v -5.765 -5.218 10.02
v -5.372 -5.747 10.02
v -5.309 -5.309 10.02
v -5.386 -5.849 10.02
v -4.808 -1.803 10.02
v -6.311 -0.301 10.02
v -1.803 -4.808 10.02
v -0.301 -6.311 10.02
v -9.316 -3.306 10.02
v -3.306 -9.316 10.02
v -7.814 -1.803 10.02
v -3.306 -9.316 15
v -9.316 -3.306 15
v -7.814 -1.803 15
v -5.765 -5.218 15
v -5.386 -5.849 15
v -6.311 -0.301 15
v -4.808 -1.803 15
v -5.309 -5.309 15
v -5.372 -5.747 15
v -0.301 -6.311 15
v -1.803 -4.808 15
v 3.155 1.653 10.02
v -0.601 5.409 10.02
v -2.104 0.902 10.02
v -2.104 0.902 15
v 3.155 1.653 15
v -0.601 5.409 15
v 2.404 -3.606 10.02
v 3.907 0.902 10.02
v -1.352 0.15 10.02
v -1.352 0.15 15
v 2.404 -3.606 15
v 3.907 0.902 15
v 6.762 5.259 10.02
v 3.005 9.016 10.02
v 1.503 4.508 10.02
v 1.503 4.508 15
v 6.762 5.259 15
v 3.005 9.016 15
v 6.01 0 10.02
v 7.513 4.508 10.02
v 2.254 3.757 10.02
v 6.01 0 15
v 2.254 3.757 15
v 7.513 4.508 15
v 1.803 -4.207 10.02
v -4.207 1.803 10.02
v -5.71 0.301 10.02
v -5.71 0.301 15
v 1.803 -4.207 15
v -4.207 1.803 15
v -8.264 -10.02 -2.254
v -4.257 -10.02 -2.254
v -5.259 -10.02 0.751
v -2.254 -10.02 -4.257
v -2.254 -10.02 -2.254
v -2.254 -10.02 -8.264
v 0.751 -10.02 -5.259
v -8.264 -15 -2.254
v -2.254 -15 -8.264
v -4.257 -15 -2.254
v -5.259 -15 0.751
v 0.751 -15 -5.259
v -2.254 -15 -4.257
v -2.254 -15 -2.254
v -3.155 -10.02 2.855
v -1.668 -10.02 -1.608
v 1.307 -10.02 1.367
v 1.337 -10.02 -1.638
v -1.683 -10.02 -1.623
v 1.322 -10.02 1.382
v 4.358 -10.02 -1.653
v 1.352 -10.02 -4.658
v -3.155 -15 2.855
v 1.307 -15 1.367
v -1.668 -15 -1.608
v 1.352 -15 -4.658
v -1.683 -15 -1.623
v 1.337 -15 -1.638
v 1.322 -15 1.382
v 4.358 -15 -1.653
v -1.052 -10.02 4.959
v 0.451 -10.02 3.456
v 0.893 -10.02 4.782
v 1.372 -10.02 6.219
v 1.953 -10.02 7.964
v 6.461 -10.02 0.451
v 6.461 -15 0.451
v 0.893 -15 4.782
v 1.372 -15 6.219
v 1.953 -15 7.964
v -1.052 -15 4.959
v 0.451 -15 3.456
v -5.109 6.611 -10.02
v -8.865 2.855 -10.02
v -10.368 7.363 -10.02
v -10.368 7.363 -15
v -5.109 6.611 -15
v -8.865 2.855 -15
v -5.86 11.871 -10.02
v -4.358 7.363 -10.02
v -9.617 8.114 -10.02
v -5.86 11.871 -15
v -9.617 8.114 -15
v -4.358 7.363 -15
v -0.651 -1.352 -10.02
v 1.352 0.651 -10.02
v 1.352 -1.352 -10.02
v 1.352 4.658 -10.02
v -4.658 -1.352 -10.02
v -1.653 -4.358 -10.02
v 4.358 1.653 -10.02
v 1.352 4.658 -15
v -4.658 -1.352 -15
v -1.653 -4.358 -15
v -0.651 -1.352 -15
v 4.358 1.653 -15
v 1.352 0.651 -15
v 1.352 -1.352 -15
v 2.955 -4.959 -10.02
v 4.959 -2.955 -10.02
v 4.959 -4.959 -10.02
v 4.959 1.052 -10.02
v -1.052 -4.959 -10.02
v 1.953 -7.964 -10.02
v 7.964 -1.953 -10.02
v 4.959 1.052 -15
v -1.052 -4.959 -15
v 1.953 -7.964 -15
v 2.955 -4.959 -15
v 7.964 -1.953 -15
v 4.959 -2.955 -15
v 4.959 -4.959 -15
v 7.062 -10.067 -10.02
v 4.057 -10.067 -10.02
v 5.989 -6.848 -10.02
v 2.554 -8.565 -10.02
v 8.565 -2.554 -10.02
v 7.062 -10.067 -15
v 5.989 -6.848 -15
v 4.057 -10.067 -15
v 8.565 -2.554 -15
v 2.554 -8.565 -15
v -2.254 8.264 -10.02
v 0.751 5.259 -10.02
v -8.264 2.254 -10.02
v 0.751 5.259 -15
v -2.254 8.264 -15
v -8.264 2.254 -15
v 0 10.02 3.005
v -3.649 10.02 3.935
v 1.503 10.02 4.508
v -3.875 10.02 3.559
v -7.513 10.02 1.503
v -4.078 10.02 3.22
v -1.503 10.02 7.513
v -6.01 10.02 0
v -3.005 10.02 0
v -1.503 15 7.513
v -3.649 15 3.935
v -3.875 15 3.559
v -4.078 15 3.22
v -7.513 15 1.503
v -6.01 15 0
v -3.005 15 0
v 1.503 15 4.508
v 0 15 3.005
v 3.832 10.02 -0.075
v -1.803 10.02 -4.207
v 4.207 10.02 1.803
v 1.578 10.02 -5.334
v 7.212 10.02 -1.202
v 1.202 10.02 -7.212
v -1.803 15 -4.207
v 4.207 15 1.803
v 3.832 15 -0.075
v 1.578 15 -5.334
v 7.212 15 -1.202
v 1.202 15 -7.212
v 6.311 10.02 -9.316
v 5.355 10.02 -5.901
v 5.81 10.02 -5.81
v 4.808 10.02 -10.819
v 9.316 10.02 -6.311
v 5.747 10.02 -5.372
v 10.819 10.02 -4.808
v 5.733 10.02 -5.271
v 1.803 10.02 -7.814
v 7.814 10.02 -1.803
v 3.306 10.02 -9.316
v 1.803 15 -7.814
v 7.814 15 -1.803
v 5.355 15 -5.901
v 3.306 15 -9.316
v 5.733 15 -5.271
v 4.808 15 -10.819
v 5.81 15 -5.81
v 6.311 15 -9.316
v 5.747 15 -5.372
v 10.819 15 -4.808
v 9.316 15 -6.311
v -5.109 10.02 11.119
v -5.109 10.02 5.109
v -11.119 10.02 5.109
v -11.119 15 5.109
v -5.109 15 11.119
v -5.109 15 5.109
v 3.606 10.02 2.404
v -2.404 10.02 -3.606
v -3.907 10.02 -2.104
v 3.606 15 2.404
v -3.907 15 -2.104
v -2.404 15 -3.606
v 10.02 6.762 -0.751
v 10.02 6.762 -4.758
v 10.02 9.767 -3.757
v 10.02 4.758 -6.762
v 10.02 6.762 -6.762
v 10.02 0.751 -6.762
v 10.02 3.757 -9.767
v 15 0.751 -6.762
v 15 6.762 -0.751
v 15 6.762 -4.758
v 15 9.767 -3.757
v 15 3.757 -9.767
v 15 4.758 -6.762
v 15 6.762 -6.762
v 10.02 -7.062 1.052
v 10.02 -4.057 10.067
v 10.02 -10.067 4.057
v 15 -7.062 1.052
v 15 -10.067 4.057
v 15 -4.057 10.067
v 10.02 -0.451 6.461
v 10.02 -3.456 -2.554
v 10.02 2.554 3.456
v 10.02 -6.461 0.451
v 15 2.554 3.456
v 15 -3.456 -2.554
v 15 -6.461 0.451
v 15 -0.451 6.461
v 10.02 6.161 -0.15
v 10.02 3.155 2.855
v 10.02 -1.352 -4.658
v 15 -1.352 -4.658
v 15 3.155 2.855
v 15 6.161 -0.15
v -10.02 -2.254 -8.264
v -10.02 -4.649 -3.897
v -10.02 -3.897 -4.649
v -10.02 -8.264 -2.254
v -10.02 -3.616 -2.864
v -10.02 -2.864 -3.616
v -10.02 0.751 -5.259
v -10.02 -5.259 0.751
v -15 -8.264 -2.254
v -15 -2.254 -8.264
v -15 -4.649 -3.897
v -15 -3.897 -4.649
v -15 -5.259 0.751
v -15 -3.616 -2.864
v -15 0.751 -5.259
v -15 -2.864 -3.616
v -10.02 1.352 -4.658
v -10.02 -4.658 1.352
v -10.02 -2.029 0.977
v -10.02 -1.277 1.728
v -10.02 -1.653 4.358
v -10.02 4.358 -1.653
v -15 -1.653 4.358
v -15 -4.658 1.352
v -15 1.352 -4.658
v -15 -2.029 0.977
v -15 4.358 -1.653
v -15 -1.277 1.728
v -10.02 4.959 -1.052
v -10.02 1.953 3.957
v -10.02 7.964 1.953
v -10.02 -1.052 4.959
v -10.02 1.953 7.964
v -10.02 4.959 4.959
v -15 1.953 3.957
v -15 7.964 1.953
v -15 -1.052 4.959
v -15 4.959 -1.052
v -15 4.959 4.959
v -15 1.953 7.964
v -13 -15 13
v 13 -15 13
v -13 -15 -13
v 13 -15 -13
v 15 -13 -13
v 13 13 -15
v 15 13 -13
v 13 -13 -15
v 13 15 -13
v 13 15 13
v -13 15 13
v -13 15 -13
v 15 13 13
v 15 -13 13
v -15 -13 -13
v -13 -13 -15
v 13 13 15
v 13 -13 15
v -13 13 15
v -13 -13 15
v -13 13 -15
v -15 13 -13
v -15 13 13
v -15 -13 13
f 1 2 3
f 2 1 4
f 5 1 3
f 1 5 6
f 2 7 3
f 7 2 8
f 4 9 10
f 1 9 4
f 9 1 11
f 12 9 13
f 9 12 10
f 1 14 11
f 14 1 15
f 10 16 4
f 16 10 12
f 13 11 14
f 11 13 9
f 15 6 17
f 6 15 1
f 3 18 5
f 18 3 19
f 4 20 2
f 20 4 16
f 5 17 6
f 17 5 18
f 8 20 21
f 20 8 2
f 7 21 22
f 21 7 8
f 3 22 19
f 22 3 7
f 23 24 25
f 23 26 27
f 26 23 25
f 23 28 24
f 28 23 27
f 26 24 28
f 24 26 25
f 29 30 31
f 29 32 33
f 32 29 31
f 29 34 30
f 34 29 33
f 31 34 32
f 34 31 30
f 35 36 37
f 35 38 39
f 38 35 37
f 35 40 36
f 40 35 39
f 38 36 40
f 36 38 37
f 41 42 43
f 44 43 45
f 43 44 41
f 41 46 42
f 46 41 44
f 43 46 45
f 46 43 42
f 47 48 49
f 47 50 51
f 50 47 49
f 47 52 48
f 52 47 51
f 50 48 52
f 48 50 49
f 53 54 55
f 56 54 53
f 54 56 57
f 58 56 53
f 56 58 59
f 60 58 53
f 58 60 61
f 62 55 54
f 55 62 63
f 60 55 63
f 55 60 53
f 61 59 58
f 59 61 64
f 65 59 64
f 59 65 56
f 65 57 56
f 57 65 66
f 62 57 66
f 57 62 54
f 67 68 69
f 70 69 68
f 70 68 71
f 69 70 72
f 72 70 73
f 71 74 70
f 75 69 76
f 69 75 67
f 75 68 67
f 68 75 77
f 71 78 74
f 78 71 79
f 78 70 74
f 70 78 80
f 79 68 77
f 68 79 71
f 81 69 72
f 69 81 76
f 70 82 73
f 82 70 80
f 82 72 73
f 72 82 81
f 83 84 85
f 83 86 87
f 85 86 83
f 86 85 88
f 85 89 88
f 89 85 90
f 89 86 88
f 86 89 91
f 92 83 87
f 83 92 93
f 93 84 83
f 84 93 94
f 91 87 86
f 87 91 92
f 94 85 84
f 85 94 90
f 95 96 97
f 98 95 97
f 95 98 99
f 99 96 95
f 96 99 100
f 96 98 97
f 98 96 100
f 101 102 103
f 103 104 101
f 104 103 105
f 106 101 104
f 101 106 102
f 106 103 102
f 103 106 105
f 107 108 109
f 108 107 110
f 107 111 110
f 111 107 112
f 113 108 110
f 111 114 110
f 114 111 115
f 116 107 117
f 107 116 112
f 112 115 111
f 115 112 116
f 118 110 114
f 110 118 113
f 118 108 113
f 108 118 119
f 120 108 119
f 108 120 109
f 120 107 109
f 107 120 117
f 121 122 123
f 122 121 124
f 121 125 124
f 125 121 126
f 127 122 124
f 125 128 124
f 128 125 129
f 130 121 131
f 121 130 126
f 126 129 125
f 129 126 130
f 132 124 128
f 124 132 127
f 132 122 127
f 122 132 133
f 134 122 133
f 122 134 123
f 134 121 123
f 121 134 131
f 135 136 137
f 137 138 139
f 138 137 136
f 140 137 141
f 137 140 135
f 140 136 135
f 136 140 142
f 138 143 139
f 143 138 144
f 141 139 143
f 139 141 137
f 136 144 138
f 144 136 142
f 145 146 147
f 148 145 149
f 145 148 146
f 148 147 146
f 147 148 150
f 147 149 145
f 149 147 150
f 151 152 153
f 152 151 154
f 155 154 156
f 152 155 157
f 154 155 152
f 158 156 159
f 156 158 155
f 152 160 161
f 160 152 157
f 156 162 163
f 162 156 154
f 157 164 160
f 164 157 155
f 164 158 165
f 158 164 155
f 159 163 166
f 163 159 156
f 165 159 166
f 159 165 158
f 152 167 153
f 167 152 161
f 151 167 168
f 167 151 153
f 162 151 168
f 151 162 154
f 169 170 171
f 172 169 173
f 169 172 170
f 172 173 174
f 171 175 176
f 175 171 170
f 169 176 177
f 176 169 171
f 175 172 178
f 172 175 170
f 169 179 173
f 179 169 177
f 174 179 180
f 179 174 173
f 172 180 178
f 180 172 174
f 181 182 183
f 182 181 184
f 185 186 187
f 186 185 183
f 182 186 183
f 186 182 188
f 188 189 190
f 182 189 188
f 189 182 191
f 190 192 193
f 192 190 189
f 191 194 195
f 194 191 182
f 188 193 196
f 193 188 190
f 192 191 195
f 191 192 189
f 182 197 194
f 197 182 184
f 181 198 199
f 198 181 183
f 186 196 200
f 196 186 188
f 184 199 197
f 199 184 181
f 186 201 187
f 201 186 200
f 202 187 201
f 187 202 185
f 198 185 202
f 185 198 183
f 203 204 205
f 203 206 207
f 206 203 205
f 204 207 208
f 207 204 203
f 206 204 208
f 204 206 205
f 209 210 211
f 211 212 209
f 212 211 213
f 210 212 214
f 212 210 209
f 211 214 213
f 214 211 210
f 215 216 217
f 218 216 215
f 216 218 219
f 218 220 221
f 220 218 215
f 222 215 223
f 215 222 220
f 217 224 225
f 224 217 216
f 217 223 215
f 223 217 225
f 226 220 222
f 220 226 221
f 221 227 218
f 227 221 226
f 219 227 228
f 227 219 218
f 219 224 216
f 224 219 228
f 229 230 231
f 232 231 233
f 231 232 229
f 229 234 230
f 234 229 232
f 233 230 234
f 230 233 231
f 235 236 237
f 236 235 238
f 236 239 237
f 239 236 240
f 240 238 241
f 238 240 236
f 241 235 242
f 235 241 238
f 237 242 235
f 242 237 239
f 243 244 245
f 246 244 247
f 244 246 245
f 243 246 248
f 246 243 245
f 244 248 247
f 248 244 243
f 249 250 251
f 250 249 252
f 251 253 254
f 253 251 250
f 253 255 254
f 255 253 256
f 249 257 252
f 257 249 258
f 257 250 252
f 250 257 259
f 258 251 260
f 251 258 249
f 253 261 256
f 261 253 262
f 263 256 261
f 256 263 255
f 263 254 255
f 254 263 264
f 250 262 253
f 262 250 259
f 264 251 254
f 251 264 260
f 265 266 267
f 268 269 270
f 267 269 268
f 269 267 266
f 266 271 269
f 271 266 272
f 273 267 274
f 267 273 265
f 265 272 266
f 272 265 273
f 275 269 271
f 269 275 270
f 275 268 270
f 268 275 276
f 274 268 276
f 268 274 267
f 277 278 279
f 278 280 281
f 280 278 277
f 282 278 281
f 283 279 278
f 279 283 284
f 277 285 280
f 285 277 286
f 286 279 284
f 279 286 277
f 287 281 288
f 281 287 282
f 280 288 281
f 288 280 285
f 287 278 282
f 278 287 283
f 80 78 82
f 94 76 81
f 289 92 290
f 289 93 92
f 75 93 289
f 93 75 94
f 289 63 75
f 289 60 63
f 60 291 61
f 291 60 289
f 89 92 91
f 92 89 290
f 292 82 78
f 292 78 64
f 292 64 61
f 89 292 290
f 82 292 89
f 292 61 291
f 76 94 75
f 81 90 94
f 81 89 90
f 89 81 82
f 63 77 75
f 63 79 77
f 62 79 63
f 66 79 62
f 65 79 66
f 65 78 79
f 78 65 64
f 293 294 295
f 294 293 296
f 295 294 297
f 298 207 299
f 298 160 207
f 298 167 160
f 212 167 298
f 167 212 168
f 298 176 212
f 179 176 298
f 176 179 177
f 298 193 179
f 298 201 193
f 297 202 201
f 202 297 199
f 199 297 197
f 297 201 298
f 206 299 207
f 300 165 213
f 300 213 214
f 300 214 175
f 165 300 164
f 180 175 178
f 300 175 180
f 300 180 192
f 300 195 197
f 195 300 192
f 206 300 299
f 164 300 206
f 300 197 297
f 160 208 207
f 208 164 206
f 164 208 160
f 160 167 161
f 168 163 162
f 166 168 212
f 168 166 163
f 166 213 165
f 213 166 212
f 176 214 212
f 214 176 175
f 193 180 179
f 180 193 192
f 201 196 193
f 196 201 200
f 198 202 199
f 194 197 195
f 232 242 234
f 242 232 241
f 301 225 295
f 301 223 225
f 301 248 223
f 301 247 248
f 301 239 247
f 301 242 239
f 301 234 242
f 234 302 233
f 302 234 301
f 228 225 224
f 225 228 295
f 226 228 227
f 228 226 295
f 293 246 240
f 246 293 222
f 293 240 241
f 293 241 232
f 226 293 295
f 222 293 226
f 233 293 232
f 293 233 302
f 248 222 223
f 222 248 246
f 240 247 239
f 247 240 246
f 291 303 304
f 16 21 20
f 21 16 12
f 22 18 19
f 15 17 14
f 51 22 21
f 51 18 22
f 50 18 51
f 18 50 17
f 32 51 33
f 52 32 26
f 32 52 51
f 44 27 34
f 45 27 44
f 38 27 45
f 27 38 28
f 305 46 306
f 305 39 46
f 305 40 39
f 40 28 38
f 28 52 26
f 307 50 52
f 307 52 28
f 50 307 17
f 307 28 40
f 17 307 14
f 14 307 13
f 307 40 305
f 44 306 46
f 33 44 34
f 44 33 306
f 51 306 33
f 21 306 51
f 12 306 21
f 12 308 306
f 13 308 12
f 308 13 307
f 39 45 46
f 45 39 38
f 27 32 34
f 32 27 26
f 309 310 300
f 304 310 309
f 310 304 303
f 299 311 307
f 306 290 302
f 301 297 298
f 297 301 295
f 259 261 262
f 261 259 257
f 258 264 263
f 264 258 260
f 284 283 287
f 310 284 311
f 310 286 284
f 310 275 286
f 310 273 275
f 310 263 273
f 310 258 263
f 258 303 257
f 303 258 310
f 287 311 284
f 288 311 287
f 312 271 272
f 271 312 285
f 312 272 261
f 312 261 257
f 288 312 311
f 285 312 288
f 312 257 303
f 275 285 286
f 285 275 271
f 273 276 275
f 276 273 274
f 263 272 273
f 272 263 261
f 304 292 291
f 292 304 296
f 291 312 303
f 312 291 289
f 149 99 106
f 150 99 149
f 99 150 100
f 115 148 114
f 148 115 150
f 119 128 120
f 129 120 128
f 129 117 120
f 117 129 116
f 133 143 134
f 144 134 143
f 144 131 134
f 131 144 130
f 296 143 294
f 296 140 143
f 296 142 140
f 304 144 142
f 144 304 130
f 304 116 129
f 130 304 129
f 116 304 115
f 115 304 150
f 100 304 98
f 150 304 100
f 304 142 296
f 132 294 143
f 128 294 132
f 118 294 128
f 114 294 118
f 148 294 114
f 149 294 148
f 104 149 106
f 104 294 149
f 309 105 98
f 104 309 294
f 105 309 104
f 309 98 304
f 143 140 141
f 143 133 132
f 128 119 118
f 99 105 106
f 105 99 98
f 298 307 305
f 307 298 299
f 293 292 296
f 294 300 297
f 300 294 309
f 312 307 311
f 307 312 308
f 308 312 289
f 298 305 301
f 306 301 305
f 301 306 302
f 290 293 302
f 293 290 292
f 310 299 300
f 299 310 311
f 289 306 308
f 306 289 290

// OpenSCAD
// fcubewithtextv1_0
// GPLv2
// (c) 2013 TakeItAndRun
//
// v0_1:
// 
// 
//

// INCLUDE

//use <lowpolyfont v1_0.scad>;
//file pasted at end of file

//*******************************************************
//
//
//
//*******************************************************

/* [text] */

ttext1="KISS";
ttext2="EAT";
ttext3="SLEEP";
ttext4="DRINK";
ttext5="LOVE";
ttext6="HUG";

/* type */

//depth of text
dt=5;//[1:10]

//scale for all text
s0=8.5;//[1:25]
//individual text scale
s1=1.0;
s2=1.0;
s3=1.0;
s4=1.0;
s5=1.0;
s6=1.0;

/* [dice] */

//size of dice
dd=30;//[5:100]

//width of edge
de=2;//[1:10]


/* HIDDEN */

ttext=[ttext1,ttext2,ttext3,ttext4,ttext5,ttext6];
s=s0*[s1,s2,s3,s4,s5,s6];

//*******************************************************
//
// basic definitions
//
//*******************************************************


// circle have $fn facets
$fn=32;

// small displacement to avoid parallel faces with zero volume
e=0.02;

// unit vectors
xaxis=[1,0,0];
yaxis=[0,1,0];
zaxis=[0,0,1];

// golden ratio
phi=(1+sqrt(5))/2;

//*******************************************************
//
// dimensions
//
//*******************************************************

dxprint=3;

col1="red";
col2="lime";


//*******************************************************
//
// routines
//
//*******************************************************

module fcube(v=[dd,dd,dd],f=de,center=false){
	translate(center?0:f*[1,1,1])
	minkowski(){
		cube(v-2*f*[1,1,1],center);
		scale(f)polyhedron(
			[[1,0,0],[0,1,0],[-1,0,0],[0,-1,0],[0,0,1],[0,0,-1]],
			[[0,1,4],[1,2,4],[2,3,4],[3,0,4],[1,0,5],[2,1,5],[3,2,5],[0,3,5]]
		);
	}
}

a=[[0,0,0],[90,0,0],[180,0,0],[270,0,0],[0,90,0],[0,270,0]];

module dice(){
	difference(){
		color("blue")
		fcube(center=true);
		for(i=[0:5])
			rotate(a[i])
			translate((dd/2-dt+e)*zaxis)
			rotate(45)
			scale([s[i]/10,s[i]/10,dt/2])
				color("yellow")
				type(ttext[i],center=true);
	}
}



//*******************************************************
//
// main program
//
//*******************************************************

dice();



// INCLUDE

// lowpolyfont v1_0
// GPLv2
// (c) 2013 TakeItAndRun
//
// v1_1: 
//

/*





*/
//*******************************************************
//
// Low polygon count font
//
//*******************************************************



//*******************************************************
//
// basic definitions
//
//*******************************************************


// small displacement to avoid parallel faces with zero volume
e=+0.02;

// unit vectors
xaxis=+[1,0,0];
yaxis=+[0,1,0];
zaxis=+[0,0,1];

//*******************************************************
//
// dimensions
//
//*******************************************************

/* [text] */

//number of lines
nl=4;//[1:4]

// Text (ONLY CAPITALS!)
text1="THE QUICK BROWN";
text2="FOX JUMBED OVER";
text3="THE LAZY DOG.";
text4="1234567890.:!?";



/* [type] */

//thickness of type
t=2;//[.1:10]

//height of type
h=10;//[1:50]

//width of type
w=5;//[1:50]

//spacing between letters
d=1;//[0.0:5.0]
dpos=d;

//conical shape
//pq=40;//[0:100]
//q=pq/100;

// spacing between lines
dl=4;//[0.0:10:0]

/* [sign] */

// sign
sign=!false;//[false:none,true:sign]
//length past type
dsx=3;//[0:10]
//height above type
dsy=3;//[0:10]
//thickness of the sign
sz=1;//[1:10]
// edge
edge=!false;//[false:none,true:sign]
// width of edge
we=1;//[0.1:10.0]


/* [Hidden] */

text=["",text1,text2,text3,text4];


//*******************************************************
//
// polygons of the letters:
//	Every letter is one element of the array fo:
// the first number is the width of the letter
//	then follows a list of polygons
//
//	the key to the (order of the) letters is the string str0
//
//*******************************************************

str0=" ABCDEFGHIJKLMNOPQRSTUVWXYZ1234567890.:!?";

fo=
[
[
// space
2,
[],

],[
//A
2,
[[0,2],[1,4],[2,2]],
[[0,2+e],[2,2+e],[0,0]],
[[0,2+e],[2,2+e],[2,0]],
],[
//B
2,
[[0,4],[2,3],[0,1.5]],
[[0,2.5],[2,1],[0,0]],
],[
//C
2,
[[0,2],[2,4],[2,0]],
],[
//D
2,
[[0,4],[2,2],[0,0]],
],[
//E
2,
[[0,4],[2,4],[0,0]],
[[0,4],[2,0],[0,0]],
[[0,4],[2,2],[0,0]],
],[
//F
2,
[[0,4],[2,4],[0,0]],
],[
//G
2,
[[0,4],[2,4],[0,0]],
[[0,1],[2,2],[2,0],[0,0]],
],[
//H
2,
[[0,4],[.75,2],[0,0]],
[[1.25,2],[2,4],[2,0]],
[[0,2.25],[2,2.25],[2,1.75],[0,1.75]],
],[
//I
1,
[[0,4],[1,4],[1,0]],
],[
//J
1,
[[1,4],[1,0],[0,0]],
],[
//K
2,
[[0,4],[1,4],[0,0]],
[[0,1.5],[2,4],[2,3]],
[[0,2.5],[2,1],[2,0]],
],[
//L
2,
[[0,4],[2,0],[0,0]],
],[
//M
2,
[[0,4],[2,2],[2,0],[0,0]],
[[2,4],[2,0],[0,0],[0,2]],
],[
//N
2,
[[0,4],[2,3],[0,0]],
[[0,1],[2,4],[2,0]],
],[
//O
2,
[[0,4],[2,4],[2,0],[0,0]],
],[
//P
2,
[[1,4],[2,3],[0,2]],
[[0,4],[1,4],[0,0]],
],[
//Q
2,
[[0,4],[2,4],[2,1.25],[.75,0],[0,0]],
[[0,2],[2,.5],[2,0],[1.5,0]],
//[[1.5,1],[2,0],[1,.5]],
],[
//R
2,
[[0,4],[1,4],[0,0]],
[[0,2],[1,4],[2,3]],
[[0,2.5],[2,1],[2,0]],
],[
//S
2,
[[2,4],[2,1.5],[0,3]],
[[0,2.5],[2,1],[0,0]],
],[
//T
2,
[[0.5,4],[1.25,4],[1,0]],
[[0,4],[2,4],[0,3]],
],[
//U
2,
[[0,4],[1,0],[0,0]],
[[2,4],[2,0],[1,0]],
[[0,0],[0,1],[2,1],[2,0]],
],[
//V
2,
[[0,4],[2,4],[1,0]],
],[
//W
2,
[[0,4],[2,4],[2,0],[0,2]],
[[0,4],[2,4],[2,2],[0,0]],
],[
//X
2,
[[0,4],[1.5,2],[.5,2]],
[[2,4],[1.5,2],[.5,2]],
[[0,0],[.5,2],[1.5,2]],
[[2,0],[.5,2],[1.5,2]],
],[
//Y
2,
[[0,4],[2,4],[1,2]],
[[0.5,4],[1.25,4],[1,0]],
],[
//Z
2,
[[0,4],[2,4],[2,3]],
[[0,0],[0,1],[2,0]],
[[0,1],[1.5,4],[2,3],[.5,0]],
],[
//1
1,
[[0,0],[1,4],[1,0]],
[[0,4],[1,4],[1,3]],
],[
//2
2,
[[0,4],[2,3],[0,2]],
[[0,0],[0,1],[2,0]],
[[0,1],[1.5,3],[2,3],[0,0]],
],[
//3
2,
[[0,4],[2,3],[0,2]],
[[0,0],[0,2+e],[2,1]],
],[
//4
2,
[[1,0],[2,4],[2,0]],
[[0,4],[2,2],[0,2]],
],[
//5
2,
[[0,4],[2,4],[0,2]],
[[0,0],[0,2+e],[2,1]],
],[
//6
2,
[[1,0],[0,1],[1,2],[2,1]],
[[0,4],[1,4],[.25,1],[0,1]],
],[
//7
2,
//[[0,4],[2,4],[2,3.5],[0,3]],
//[[0,4],[1,4],[.25,1],[0,1]],
[[0,4],[2,4],[2,0]],
],[
//8
2,
[[1,0],[0,1],[1,2+e],[2,1]],
[[1,4],[2,3],[1,2],[0,3]],
],[
//9
2,
[[1,4],[2,3],[1,2],[0,3]],
[[1,0],[1.75,3],[2,3],[2,0]],
],[
//0
2,
[[1,0],[0,1],[0,3],[1,4],[2,3],[2,1]],
],[
//.
1,
[[0,0],[1,1],[1,0]],
],[
//:
1,
[[0,0],[1,1],[1,0]],
[[0,2],[1,3],[1,2]],
],[
//!
1,
[[0,0],[1,1],[1,0]],
[[0,4],[1,4],[.5,1+e]],
],[
//?
2,
[[0.5,0],[1.5,1],[1.5,0]],
[[1,4],[2,4],[1,1+e]],
[[0,4],[2,4],[0,3]],
],[

]
];


//*******************************************************
//
// routines
//
//*******************************************************

// make the i-th letter in the string str0
module letter(s){
	for(i=[1:len(fo[s])-1]){
// comment out the line with linear_extrude to get a 2-dim output for a dxf export
	linear_extrude(height=t)
		scale([w/2,h/4])polygon(fo[s][i]);
	}
}

// print one line of text 
// str: text to be printed (use only letters that are included in the string str0 (capital letters, numbers, some special characters)
module type(str,center=false){
	translate([(center)?-(pos(len(str),str)-dpos/2)/2:0,(center)?-h/2:0,0])
	for(i=[0:len(str)-1]){
		translate(pos(i,str)*xaxis)
		letter(index(str[i],str0));
	}
}


module sign(){
// calculate x,y-dimensions of the sign
	ssx=maximum(nl)+2*dsx+((edge)?4*we:0);
	ssy=nl*h+(nl-1)*dl+2*dsy+((edge)?4*we:0);

	color("yellow")
	translate((nl-1)*(h+dl)/2*yaxis+((sign)?sz:0)*zaxis)
	for (i=[1:nl]){
		translate(-(i-1)*(h+dl)*yaxis)
			type(text[i],true);
	}
	if (sign){
		color("blue")
		translate(sz/2*zaxis)
			cube([ssx,ssy,sz],true);
		color("yellow")
		translate((sz+t/2)*zaxis)
			for(m=[-1,1]){
				translate(m*(ssy-3*we)/2*yaxis)
					cube([ssx-2*we,we,t],true);
				translate(m*(ssx-3*we)/2*xaxis)
					cube([we,ssy-2*we,t],true);
			}
	}
}



// get the length of the longest line
function maximum(nl,i=1)=(i<nl)?
	max((pos(len(text[i]),text[i])-dpos/2),maximum(nl,i+1)):
	(pos(len(text[i]),text[i])-dpos/2)
;

// return index of a letter in the fo vector / string str0
function index(str)=
	search(str,str0)[0];


// Calculate the position of the i-th letter as sum of the
// width plus spacing of all the letters before it.
// This function looks so witty because OpenSCAD does not
// allow re-assignment of variables during run time.
// The idea for this function (somewhat simplified) I took from
// http://www.thingiverse.com/thing:22730
// by Bernhard -HotKey- Slawik, http://www.bernhardslawik.de
// This function is defined only for 80 characters. You may 
// expand it if you need more than 80 characters per line.
function pos(i,str)=
	w/2*(
	(i==0)?0:i*dpos*2/w
	+((i>=1)?fo[index(str[0])][0]:0)
	+((i>=2)?fo[index(str[1])][0]:0)
	+((i>=3)?fo[index(str[2])][0]:0)
	+((i>=4)?fo[index(str[3])][0]:0)
	+((i>=5)?fo[index(str[4])][0]:0)
	+((i>=6)?fo[index(str[5])][0]:0)
	+((i>=7)?fo[index(str[6])][0]:0)
	+((i>=8)?fo[index(str[7])][0]:0)
	+((i>=9)?fo[index(str[8])][0]:0)
	+((i>=10)?fo[index(str[9])][0]:0)
	+((i>=11)?fo[index(str[10])][0]:0)
	+((i>=12)?fo[index(str[11])][0]:0)
	+((i>=13)?fo[index(str[12])][0]:0)
	+((i>=14)?fo[index(str[13])][0]:0)
	+((i>=15)?fo[index(str[14])][0]:0)
	+((i>=16)?fo[index(str[15])][0]:0)
	+((i>=17)?fo[index(str[16])][0]:0)
	+((i>=18)?fo[index(str[17])][0]:0)
	+((i>=19)?fo[index(str[18])][0]:0)
	+((i>=20)?fo[index(str[19])][0]:0)
	+((i>=21)?fo[index(str[20])][0]:0)
	+((i>=22)?fo[index(str[21])][0]:0)
	+((i>=23)?fo[index(str[22])][0]:0)
	+((i>=24)?fo[index(str[23])][0]:0)
	+((i>=25)?fo[index(str[24])][0]:0)
	+((i>=26)?fo[index(str[25])][0]:0)
	+((i>=27)?fo[index(str[26])][0]:0)
	+((i>=28)?fo[index(str[27])][0]:0)
	+((i>=29)?fo[index(str[28])][0]:0)
	+((i>=30)?fo[index(str[29])][0]:0)
	+((i>=31)?fo[index(str[30])][0]:0)
	+((i>=32)?fo[index(str[31])][0]:0)
	+((i>=33)?fo[index(str[32])][0]:0)
	+((i>=34)?fo[index(str[33])][0]:0)
	+((i>=35)?fo[index(str[34])][0]:0)
	+((i>=36)?fo[index(str[35])][0]:0)
	+((i>=37)?fo[index(str[36])][0]:0)
	+((i>=38)?fo[index(str[37])][0]:0)
	+((i>=39)?fo[index(str[38])][0]:0)
	+((i>=40)?fo[index(str[39])][0]:0)
	+((i>=41)?fo[index(str[40])][0]:0)
	+((i>=42)?fo[index(str[41])][0]:0)
	+((i>=43)?fo[index(str[42])][0]:0)
	+((i>=44)?fo[index(str[43])][0]:0)
	+((i>=45)?fo[index(str[44])][0]:0)
	+((i>=46)?fo[index(str[45])][0]:0)
	+((i>=47)?fo[index(str[46])][0]:0)
	+((i>=48)?fo[index(str[47])][0]:0)
	+((i>=49)?fo[index(str[48])][0]:0)
	+((i>=50)?fo[index(str[49])][0]:0)
	+((i>=51)?fo[index(str[50])][0]:0)
	+((i>=52)?fo[index(str[51])][0]:0)
	+((i>=53)?fo[index(str[52])][0]:0)
	+((i>=54)?fo[index(str[53])][0]:0)
	+((i>=55)?fo[index(str[54])][0]:0)
	+((i>=56)?fo[index(str[55])][0]:0)
	+((i>=57)?fo[index(str[56])][0]:0)
	+((i>=58)?fo[index(str[57])][0]:0)
	+((i>=59)?fo[index(str[58])][0]:0)
	+((i>=60)?fo[index(str[59])][0]:0)
	+((i>=61)?fo[index(str[60])][0]:0)
	+((i>=62)?fo[index(str[61])][0]:0)
	+((i>=63)?fo[index(str[62])][0]:0)
	+((i>=64)?fo[index(str[63])][0]:0)
	+((i>=65)?fo[index(str[64])][0]:0)
	+((i>=66)?fo[index(str[65])][0]:0)
	+((i>=67)?fo[index(str[66])][0]:0)
	+((i>=68)?fo[index(str[67])][0]:0)
	+((i>=69)?fo[index(str[68])][0]:0)
	+((i>=70)?fo[index(str[69])][0]:0)
	+((i>=71)?fo[index(str[70])][0]:0)
	+((i>=72)?fo[index(str[71])][0]:0)
	+((i>=73)?fo[index(str[72])][0]:0)
	+((i>=74)?fo[index(str[73])][0]:0)
	+((i>=75)?fo[index(str[74])][0]:0)
	+((i>=76)?fo[index(str[75])][0]:0)
	+((i>=77)?fo[index(str[76])][0]:0)
	+((i>=78)?fo[index(str[77])][0]:0)
	+((i>=79)?fo[index(str[78])][0]:0)
	+((i>=80)?fo[index(str[79])][0]:0)
	)
//	+((i>=4)?fo[index(str[4])][0]:0)

;


//*******************************************************
//
// main program
//
//*******************************************************



// one line of text
//str="THE QUICK BROWN FOX JUMBED OVER THE LAZY DOG.";
//str=str0;
//type(str,!true);

// sign with up to 4 lines of text (if sign=true, else just the text)
//sign();
